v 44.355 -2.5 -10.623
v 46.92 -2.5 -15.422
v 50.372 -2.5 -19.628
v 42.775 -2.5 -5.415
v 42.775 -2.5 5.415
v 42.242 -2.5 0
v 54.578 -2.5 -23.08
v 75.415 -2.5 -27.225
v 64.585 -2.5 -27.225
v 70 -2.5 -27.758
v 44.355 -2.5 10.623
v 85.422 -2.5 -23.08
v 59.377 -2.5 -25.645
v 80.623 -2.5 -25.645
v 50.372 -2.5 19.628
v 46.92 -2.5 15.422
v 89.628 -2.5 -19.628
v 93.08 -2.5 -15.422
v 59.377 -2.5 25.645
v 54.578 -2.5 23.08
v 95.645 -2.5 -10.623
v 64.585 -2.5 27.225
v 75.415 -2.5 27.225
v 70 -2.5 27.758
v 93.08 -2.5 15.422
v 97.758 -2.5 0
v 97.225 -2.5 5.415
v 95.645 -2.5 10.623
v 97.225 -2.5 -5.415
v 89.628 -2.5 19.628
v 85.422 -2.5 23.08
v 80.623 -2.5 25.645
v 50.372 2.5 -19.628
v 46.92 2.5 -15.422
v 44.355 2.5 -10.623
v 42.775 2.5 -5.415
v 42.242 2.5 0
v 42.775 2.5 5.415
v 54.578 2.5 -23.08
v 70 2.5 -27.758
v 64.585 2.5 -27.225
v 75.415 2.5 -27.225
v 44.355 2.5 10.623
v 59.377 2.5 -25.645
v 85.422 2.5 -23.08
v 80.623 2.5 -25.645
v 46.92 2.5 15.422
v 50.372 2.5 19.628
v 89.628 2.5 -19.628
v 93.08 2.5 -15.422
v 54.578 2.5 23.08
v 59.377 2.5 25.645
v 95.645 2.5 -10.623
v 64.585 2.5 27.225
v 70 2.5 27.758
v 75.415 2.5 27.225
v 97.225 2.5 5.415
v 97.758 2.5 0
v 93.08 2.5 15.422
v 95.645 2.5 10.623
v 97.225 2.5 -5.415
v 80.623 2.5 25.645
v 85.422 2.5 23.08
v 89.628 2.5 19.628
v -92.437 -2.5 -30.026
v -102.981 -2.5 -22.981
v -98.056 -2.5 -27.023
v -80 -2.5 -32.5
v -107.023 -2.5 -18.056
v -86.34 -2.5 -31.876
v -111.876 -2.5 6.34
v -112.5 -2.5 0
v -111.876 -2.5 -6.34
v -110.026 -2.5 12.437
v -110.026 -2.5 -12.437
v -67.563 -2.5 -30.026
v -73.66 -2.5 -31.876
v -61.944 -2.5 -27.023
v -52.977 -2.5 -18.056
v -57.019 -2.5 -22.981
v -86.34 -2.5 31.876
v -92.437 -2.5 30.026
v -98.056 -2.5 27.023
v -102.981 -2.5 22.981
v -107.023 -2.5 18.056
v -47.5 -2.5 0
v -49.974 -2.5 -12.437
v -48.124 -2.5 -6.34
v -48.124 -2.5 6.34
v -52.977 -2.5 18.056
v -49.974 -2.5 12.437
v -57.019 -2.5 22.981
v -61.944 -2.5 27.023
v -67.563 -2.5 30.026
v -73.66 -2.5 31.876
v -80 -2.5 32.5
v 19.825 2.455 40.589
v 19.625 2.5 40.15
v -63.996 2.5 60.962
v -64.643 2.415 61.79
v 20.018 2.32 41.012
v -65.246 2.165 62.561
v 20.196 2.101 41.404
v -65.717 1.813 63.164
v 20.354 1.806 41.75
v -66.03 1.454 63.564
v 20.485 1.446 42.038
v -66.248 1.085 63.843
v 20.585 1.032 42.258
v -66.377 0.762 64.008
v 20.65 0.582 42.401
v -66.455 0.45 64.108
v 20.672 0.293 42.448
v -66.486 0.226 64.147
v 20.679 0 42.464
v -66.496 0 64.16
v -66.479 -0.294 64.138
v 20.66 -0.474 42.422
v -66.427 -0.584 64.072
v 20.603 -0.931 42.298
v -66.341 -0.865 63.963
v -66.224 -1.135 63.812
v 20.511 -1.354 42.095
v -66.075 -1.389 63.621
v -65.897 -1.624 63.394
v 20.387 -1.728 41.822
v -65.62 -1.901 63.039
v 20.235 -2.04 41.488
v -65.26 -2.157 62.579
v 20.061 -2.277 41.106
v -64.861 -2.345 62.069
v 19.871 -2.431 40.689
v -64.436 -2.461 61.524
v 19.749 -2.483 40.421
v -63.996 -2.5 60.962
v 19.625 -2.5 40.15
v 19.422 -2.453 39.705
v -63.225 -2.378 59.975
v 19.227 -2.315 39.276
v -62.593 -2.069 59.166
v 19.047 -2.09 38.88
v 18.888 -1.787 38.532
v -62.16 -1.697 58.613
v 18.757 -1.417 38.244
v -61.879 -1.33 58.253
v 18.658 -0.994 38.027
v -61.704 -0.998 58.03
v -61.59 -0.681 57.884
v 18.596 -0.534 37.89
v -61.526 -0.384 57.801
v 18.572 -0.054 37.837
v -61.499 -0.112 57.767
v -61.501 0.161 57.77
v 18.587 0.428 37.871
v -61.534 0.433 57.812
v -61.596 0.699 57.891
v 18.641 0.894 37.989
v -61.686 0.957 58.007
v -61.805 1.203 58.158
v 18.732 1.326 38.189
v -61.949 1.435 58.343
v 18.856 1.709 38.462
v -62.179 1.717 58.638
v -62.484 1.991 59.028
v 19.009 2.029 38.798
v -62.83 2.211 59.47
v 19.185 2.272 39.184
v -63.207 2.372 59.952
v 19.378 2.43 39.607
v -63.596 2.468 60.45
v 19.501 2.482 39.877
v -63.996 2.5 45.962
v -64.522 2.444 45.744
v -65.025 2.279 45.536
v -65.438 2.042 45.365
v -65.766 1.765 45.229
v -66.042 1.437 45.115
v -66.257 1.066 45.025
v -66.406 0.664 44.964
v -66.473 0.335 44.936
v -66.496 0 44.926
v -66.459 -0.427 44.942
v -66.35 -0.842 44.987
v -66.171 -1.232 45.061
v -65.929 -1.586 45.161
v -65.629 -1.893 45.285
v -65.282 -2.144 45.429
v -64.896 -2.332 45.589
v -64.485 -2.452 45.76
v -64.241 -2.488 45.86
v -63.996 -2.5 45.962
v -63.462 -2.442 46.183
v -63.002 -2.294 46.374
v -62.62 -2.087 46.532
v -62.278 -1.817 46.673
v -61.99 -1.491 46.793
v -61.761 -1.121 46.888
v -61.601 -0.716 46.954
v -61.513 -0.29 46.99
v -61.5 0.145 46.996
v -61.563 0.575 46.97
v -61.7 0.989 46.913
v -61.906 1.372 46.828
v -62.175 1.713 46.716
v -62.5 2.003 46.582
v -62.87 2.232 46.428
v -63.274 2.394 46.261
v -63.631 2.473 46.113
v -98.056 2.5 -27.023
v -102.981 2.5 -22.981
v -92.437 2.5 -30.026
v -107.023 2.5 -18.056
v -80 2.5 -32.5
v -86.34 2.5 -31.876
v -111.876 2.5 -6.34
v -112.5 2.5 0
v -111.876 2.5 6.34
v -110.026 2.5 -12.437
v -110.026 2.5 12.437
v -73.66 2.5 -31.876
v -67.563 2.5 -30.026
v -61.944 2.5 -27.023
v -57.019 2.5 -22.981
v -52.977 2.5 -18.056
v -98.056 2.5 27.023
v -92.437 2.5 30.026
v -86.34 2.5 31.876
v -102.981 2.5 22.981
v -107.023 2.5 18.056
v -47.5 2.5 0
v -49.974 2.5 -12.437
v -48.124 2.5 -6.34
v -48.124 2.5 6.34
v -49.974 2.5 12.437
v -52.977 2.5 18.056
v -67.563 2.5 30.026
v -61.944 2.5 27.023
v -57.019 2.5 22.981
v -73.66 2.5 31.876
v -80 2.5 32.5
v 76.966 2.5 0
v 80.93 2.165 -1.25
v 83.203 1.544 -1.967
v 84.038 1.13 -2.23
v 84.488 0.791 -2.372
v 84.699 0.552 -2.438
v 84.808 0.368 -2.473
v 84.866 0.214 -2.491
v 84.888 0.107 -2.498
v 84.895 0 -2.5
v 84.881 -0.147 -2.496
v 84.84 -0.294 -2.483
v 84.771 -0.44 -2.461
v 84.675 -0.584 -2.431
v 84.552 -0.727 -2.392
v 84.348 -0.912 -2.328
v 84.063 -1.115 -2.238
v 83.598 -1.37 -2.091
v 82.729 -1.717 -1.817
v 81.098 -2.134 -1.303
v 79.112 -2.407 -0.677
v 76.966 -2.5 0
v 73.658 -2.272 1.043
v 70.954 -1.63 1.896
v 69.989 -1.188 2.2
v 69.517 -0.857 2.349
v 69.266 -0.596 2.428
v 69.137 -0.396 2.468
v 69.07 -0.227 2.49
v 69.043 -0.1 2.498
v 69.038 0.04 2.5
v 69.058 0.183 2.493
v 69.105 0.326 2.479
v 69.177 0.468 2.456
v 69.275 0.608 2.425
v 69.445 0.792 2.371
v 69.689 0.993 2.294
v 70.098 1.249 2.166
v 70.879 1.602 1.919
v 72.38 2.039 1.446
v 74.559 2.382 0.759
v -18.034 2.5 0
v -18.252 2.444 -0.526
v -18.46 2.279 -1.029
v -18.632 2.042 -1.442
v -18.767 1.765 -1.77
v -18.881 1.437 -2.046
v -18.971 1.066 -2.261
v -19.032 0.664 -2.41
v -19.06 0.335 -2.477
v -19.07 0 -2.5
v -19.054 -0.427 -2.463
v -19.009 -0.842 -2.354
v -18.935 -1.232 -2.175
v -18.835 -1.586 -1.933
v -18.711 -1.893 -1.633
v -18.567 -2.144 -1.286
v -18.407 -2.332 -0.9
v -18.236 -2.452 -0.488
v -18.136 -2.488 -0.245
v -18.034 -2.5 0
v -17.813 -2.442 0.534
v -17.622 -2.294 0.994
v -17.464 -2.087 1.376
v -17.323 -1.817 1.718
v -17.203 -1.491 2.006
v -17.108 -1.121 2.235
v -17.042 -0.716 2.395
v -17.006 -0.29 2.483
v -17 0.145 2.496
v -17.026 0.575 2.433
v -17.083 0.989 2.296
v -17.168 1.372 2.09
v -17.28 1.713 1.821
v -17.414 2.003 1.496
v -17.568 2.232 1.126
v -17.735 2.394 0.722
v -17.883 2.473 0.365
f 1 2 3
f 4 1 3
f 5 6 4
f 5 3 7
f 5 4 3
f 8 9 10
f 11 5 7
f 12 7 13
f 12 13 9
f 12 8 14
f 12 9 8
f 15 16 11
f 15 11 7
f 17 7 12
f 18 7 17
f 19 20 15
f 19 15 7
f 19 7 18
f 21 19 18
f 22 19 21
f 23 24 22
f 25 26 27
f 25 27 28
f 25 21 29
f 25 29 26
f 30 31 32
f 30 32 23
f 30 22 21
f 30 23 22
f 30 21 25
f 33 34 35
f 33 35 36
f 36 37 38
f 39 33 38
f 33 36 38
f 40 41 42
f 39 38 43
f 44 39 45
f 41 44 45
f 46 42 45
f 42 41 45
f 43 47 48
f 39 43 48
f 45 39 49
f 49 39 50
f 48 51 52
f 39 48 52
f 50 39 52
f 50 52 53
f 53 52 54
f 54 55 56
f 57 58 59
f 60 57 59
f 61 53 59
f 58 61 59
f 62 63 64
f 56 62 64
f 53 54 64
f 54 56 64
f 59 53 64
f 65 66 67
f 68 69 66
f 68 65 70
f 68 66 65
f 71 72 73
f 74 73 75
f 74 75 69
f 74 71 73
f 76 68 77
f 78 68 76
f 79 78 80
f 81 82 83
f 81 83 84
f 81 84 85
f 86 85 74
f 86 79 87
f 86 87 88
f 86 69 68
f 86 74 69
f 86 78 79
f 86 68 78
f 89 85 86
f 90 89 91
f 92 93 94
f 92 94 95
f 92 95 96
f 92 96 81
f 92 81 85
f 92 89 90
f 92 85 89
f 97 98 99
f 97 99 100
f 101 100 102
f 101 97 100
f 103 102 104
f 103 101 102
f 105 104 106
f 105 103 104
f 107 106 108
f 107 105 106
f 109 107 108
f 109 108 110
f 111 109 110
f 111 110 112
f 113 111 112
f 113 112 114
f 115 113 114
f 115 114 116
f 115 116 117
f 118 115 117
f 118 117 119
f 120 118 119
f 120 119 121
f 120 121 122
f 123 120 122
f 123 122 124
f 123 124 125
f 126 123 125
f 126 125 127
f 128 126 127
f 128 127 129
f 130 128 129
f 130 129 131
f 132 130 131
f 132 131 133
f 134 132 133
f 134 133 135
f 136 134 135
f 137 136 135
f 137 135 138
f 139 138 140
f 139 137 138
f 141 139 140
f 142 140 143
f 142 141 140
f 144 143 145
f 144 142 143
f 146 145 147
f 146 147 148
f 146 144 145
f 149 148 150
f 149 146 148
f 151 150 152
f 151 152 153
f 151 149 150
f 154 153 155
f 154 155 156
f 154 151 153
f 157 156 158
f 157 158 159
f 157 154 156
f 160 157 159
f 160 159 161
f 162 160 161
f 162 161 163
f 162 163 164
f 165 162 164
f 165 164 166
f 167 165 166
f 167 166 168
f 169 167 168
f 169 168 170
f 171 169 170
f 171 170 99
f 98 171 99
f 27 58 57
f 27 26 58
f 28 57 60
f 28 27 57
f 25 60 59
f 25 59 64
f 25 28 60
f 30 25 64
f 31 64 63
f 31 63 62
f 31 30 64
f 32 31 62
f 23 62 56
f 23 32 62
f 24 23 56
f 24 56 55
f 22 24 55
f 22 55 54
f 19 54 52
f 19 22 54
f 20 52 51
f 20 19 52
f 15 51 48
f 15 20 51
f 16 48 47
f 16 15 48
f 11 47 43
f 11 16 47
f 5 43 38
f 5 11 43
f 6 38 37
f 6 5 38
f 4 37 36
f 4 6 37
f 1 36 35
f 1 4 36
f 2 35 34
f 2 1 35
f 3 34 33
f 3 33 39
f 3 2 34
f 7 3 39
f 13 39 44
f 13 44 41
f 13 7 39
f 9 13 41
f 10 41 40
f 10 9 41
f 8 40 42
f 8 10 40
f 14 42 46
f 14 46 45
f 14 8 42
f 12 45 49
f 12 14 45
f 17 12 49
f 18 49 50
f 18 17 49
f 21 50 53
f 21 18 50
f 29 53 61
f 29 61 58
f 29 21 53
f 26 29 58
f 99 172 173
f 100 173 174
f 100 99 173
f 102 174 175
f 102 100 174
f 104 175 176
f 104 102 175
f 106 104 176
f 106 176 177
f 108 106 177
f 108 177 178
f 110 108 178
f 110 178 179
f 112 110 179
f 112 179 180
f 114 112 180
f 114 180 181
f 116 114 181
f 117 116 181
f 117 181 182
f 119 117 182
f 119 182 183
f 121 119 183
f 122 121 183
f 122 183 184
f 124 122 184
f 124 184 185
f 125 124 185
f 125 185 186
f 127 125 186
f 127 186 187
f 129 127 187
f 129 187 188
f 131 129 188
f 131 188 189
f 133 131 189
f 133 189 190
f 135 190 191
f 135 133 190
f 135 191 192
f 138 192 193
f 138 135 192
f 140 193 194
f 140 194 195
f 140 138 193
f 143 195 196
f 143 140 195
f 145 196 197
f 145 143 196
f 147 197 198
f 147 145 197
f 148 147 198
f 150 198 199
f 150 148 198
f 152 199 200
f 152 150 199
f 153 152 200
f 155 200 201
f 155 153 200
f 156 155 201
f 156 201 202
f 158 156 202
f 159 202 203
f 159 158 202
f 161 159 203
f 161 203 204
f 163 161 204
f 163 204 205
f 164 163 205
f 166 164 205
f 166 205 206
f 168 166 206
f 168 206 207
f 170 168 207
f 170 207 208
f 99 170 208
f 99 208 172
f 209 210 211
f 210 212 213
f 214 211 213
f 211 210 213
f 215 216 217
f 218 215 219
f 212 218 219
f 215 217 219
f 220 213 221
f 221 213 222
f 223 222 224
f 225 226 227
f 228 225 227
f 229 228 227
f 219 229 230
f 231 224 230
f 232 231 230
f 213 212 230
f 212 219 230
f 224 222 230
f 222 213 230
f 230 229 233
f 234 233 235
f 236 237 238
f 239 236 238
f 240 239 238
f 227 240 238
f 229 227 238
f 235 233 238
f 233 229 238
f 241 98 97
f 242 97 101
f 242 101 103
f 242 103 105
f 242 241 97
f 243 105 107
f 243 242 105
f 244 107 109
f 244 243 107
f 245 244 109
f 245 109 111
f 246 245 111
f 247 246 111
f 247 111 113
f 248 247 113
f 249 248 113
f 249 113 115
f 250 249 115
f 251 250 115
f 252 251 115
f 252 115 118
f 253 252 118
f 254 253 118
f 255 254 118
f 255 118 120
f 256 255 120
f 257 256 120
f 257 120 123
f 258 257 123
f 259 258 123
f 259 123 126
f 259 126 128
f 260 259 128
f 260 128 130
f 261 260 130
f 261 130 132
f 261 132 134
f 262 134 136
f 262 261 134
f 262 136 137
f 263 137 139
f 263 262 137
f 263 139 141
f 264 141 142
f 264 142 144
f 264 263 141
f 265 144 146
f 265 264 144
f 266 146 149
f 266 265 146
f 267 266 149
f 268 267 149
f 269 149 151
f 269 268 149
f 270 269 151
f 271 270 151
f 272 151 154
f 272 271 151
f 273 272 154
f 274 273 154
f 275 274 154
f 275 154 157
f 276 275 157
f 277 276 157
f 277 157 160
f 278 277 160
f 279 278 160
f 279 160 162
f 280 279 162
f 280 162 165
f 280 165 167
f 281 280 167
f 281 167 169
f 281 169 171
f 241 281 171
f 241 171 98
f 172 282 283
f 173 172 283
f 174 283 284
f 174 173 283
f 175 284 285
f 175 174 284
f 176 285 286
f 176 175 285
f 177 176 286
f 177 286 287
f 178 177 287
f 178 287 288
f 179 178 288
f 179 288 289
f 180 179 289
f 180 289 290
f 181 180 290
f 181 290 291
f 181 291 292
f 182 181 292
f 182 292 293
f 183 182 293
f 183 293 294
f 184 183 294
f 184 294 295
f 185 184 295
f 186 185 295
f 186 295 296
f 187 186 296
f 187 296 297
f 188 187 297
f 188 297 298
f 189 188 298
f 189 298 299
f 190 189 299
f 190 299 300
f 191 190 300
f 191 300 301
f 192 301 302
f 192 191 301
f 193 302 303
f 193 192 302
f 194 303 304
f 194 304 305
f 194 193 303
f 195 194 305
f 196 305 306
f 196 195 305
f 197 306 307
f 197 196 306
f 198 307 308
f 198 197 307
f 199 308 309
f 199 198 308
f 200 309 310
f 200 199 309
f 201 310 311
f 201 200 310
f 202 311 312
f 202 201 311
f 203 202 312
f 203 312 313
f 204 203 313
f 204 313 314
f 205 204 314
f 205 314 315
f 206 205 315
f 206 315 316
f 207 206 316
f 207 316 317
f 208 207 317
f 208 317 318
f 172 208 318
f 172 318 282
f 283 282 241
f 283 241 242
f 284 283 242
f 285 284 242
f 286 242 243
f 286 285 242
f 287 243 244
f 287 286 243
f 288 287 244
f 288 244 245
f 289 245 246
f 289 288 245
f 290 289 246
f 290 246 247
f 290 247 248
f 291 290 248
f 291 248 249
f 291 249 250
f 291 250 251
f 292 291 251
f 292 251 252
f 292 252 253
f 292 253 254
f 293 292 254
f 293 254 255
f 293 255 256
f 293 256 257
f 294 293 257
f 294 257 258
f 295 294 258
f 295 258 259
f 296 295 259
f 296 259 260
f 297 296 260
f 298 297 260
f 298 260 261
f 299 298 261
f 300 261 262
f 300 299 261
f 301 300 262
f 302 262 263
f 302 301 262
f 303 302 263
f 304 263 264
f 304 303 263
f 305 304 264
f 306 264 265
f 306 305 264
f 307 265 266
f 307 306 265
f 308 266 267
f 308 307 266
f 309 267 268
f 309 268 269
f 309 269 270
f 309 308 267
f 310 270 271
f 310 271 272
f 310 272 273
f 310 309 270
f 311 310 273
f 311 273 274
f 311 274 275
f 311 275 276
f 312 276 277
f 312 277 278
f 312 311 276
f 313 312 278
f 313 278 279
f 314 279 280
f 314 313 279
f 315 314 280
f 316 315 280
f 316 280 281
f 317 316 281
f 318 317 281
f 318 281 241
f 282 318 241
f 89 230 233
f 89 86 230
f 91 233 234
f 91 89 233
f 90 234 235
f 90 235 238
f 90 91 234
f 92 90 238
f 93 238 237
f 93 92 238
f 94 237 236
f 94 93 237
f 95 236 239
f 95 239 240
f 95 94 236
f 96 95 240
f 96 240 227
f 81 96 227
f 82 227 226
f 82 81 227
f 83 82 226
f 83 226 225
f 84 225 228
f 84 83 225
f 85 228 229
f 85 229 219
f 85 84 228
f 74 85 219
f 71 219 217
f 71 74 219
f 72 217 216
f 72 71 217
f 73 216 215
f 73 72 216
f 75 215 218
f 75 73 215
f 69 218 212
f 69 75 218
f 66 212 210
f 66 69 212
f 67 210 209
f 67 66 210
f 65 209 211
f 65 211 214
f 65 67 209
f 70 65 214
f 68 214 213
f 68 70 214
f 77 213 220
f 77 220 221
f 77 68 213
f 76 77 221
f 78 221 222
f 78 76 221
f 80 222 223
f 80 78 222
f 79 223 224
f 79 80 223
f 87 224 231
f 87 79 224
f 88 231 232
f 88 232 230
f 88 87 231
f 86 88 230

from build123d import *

# Parameters (mm, degrees)
F0_R     = 27.7583541482
F1_DEPTH = 2.5
F0_R_2   = 32.5
F3_R     = 2.5


with BuildPart() as f1:
    # F0 (on Front) → F1 (new body, symmetric)
    with BuildSketch(Plane.XZ):
        with Locations((70, 0)):
            Circle(F0_R)
    extrude(amount=F1_DEPTH, both=True)


with BuildPart() as f1b:
    # F0 (on Front) → F1, piece 2 (new body, symmetric)
    with BuildSketch(Plane.XZ):
        with Locations((-80, 0)):
            Circle(F0_R_2)
    extrude(amount=F1_DEPTH, both=True)


with BuildPart() as f4:
    # F4: sweep along a path in F2
    with BuildLine(Plane.XZ) as f4_path:
        Line((76.965931304, 0), (-18.034068696, 0))
        Line((-18.034068696, 0), (-63.9960094731, 45.9619407771))
        Line((-63.9960094731, 45.9619407771), (-63.9960094731, 60.9619407771))
        Line((-63.9960094731, 60.9619407771), (19.6252882037, 40.1503505446))
        Line((19.6252882037, 40.1503505446), (76.965931304, 0))
    # F3 (on Right) → F4 (sweep)
    with BuildSketch(Plane.YZ):
        Circle(F3_R)
    sweep(path=f4_path.line, transition=Transition.RIGHT)


solid = Compound([f1.part, f1b.part, f4.part])
